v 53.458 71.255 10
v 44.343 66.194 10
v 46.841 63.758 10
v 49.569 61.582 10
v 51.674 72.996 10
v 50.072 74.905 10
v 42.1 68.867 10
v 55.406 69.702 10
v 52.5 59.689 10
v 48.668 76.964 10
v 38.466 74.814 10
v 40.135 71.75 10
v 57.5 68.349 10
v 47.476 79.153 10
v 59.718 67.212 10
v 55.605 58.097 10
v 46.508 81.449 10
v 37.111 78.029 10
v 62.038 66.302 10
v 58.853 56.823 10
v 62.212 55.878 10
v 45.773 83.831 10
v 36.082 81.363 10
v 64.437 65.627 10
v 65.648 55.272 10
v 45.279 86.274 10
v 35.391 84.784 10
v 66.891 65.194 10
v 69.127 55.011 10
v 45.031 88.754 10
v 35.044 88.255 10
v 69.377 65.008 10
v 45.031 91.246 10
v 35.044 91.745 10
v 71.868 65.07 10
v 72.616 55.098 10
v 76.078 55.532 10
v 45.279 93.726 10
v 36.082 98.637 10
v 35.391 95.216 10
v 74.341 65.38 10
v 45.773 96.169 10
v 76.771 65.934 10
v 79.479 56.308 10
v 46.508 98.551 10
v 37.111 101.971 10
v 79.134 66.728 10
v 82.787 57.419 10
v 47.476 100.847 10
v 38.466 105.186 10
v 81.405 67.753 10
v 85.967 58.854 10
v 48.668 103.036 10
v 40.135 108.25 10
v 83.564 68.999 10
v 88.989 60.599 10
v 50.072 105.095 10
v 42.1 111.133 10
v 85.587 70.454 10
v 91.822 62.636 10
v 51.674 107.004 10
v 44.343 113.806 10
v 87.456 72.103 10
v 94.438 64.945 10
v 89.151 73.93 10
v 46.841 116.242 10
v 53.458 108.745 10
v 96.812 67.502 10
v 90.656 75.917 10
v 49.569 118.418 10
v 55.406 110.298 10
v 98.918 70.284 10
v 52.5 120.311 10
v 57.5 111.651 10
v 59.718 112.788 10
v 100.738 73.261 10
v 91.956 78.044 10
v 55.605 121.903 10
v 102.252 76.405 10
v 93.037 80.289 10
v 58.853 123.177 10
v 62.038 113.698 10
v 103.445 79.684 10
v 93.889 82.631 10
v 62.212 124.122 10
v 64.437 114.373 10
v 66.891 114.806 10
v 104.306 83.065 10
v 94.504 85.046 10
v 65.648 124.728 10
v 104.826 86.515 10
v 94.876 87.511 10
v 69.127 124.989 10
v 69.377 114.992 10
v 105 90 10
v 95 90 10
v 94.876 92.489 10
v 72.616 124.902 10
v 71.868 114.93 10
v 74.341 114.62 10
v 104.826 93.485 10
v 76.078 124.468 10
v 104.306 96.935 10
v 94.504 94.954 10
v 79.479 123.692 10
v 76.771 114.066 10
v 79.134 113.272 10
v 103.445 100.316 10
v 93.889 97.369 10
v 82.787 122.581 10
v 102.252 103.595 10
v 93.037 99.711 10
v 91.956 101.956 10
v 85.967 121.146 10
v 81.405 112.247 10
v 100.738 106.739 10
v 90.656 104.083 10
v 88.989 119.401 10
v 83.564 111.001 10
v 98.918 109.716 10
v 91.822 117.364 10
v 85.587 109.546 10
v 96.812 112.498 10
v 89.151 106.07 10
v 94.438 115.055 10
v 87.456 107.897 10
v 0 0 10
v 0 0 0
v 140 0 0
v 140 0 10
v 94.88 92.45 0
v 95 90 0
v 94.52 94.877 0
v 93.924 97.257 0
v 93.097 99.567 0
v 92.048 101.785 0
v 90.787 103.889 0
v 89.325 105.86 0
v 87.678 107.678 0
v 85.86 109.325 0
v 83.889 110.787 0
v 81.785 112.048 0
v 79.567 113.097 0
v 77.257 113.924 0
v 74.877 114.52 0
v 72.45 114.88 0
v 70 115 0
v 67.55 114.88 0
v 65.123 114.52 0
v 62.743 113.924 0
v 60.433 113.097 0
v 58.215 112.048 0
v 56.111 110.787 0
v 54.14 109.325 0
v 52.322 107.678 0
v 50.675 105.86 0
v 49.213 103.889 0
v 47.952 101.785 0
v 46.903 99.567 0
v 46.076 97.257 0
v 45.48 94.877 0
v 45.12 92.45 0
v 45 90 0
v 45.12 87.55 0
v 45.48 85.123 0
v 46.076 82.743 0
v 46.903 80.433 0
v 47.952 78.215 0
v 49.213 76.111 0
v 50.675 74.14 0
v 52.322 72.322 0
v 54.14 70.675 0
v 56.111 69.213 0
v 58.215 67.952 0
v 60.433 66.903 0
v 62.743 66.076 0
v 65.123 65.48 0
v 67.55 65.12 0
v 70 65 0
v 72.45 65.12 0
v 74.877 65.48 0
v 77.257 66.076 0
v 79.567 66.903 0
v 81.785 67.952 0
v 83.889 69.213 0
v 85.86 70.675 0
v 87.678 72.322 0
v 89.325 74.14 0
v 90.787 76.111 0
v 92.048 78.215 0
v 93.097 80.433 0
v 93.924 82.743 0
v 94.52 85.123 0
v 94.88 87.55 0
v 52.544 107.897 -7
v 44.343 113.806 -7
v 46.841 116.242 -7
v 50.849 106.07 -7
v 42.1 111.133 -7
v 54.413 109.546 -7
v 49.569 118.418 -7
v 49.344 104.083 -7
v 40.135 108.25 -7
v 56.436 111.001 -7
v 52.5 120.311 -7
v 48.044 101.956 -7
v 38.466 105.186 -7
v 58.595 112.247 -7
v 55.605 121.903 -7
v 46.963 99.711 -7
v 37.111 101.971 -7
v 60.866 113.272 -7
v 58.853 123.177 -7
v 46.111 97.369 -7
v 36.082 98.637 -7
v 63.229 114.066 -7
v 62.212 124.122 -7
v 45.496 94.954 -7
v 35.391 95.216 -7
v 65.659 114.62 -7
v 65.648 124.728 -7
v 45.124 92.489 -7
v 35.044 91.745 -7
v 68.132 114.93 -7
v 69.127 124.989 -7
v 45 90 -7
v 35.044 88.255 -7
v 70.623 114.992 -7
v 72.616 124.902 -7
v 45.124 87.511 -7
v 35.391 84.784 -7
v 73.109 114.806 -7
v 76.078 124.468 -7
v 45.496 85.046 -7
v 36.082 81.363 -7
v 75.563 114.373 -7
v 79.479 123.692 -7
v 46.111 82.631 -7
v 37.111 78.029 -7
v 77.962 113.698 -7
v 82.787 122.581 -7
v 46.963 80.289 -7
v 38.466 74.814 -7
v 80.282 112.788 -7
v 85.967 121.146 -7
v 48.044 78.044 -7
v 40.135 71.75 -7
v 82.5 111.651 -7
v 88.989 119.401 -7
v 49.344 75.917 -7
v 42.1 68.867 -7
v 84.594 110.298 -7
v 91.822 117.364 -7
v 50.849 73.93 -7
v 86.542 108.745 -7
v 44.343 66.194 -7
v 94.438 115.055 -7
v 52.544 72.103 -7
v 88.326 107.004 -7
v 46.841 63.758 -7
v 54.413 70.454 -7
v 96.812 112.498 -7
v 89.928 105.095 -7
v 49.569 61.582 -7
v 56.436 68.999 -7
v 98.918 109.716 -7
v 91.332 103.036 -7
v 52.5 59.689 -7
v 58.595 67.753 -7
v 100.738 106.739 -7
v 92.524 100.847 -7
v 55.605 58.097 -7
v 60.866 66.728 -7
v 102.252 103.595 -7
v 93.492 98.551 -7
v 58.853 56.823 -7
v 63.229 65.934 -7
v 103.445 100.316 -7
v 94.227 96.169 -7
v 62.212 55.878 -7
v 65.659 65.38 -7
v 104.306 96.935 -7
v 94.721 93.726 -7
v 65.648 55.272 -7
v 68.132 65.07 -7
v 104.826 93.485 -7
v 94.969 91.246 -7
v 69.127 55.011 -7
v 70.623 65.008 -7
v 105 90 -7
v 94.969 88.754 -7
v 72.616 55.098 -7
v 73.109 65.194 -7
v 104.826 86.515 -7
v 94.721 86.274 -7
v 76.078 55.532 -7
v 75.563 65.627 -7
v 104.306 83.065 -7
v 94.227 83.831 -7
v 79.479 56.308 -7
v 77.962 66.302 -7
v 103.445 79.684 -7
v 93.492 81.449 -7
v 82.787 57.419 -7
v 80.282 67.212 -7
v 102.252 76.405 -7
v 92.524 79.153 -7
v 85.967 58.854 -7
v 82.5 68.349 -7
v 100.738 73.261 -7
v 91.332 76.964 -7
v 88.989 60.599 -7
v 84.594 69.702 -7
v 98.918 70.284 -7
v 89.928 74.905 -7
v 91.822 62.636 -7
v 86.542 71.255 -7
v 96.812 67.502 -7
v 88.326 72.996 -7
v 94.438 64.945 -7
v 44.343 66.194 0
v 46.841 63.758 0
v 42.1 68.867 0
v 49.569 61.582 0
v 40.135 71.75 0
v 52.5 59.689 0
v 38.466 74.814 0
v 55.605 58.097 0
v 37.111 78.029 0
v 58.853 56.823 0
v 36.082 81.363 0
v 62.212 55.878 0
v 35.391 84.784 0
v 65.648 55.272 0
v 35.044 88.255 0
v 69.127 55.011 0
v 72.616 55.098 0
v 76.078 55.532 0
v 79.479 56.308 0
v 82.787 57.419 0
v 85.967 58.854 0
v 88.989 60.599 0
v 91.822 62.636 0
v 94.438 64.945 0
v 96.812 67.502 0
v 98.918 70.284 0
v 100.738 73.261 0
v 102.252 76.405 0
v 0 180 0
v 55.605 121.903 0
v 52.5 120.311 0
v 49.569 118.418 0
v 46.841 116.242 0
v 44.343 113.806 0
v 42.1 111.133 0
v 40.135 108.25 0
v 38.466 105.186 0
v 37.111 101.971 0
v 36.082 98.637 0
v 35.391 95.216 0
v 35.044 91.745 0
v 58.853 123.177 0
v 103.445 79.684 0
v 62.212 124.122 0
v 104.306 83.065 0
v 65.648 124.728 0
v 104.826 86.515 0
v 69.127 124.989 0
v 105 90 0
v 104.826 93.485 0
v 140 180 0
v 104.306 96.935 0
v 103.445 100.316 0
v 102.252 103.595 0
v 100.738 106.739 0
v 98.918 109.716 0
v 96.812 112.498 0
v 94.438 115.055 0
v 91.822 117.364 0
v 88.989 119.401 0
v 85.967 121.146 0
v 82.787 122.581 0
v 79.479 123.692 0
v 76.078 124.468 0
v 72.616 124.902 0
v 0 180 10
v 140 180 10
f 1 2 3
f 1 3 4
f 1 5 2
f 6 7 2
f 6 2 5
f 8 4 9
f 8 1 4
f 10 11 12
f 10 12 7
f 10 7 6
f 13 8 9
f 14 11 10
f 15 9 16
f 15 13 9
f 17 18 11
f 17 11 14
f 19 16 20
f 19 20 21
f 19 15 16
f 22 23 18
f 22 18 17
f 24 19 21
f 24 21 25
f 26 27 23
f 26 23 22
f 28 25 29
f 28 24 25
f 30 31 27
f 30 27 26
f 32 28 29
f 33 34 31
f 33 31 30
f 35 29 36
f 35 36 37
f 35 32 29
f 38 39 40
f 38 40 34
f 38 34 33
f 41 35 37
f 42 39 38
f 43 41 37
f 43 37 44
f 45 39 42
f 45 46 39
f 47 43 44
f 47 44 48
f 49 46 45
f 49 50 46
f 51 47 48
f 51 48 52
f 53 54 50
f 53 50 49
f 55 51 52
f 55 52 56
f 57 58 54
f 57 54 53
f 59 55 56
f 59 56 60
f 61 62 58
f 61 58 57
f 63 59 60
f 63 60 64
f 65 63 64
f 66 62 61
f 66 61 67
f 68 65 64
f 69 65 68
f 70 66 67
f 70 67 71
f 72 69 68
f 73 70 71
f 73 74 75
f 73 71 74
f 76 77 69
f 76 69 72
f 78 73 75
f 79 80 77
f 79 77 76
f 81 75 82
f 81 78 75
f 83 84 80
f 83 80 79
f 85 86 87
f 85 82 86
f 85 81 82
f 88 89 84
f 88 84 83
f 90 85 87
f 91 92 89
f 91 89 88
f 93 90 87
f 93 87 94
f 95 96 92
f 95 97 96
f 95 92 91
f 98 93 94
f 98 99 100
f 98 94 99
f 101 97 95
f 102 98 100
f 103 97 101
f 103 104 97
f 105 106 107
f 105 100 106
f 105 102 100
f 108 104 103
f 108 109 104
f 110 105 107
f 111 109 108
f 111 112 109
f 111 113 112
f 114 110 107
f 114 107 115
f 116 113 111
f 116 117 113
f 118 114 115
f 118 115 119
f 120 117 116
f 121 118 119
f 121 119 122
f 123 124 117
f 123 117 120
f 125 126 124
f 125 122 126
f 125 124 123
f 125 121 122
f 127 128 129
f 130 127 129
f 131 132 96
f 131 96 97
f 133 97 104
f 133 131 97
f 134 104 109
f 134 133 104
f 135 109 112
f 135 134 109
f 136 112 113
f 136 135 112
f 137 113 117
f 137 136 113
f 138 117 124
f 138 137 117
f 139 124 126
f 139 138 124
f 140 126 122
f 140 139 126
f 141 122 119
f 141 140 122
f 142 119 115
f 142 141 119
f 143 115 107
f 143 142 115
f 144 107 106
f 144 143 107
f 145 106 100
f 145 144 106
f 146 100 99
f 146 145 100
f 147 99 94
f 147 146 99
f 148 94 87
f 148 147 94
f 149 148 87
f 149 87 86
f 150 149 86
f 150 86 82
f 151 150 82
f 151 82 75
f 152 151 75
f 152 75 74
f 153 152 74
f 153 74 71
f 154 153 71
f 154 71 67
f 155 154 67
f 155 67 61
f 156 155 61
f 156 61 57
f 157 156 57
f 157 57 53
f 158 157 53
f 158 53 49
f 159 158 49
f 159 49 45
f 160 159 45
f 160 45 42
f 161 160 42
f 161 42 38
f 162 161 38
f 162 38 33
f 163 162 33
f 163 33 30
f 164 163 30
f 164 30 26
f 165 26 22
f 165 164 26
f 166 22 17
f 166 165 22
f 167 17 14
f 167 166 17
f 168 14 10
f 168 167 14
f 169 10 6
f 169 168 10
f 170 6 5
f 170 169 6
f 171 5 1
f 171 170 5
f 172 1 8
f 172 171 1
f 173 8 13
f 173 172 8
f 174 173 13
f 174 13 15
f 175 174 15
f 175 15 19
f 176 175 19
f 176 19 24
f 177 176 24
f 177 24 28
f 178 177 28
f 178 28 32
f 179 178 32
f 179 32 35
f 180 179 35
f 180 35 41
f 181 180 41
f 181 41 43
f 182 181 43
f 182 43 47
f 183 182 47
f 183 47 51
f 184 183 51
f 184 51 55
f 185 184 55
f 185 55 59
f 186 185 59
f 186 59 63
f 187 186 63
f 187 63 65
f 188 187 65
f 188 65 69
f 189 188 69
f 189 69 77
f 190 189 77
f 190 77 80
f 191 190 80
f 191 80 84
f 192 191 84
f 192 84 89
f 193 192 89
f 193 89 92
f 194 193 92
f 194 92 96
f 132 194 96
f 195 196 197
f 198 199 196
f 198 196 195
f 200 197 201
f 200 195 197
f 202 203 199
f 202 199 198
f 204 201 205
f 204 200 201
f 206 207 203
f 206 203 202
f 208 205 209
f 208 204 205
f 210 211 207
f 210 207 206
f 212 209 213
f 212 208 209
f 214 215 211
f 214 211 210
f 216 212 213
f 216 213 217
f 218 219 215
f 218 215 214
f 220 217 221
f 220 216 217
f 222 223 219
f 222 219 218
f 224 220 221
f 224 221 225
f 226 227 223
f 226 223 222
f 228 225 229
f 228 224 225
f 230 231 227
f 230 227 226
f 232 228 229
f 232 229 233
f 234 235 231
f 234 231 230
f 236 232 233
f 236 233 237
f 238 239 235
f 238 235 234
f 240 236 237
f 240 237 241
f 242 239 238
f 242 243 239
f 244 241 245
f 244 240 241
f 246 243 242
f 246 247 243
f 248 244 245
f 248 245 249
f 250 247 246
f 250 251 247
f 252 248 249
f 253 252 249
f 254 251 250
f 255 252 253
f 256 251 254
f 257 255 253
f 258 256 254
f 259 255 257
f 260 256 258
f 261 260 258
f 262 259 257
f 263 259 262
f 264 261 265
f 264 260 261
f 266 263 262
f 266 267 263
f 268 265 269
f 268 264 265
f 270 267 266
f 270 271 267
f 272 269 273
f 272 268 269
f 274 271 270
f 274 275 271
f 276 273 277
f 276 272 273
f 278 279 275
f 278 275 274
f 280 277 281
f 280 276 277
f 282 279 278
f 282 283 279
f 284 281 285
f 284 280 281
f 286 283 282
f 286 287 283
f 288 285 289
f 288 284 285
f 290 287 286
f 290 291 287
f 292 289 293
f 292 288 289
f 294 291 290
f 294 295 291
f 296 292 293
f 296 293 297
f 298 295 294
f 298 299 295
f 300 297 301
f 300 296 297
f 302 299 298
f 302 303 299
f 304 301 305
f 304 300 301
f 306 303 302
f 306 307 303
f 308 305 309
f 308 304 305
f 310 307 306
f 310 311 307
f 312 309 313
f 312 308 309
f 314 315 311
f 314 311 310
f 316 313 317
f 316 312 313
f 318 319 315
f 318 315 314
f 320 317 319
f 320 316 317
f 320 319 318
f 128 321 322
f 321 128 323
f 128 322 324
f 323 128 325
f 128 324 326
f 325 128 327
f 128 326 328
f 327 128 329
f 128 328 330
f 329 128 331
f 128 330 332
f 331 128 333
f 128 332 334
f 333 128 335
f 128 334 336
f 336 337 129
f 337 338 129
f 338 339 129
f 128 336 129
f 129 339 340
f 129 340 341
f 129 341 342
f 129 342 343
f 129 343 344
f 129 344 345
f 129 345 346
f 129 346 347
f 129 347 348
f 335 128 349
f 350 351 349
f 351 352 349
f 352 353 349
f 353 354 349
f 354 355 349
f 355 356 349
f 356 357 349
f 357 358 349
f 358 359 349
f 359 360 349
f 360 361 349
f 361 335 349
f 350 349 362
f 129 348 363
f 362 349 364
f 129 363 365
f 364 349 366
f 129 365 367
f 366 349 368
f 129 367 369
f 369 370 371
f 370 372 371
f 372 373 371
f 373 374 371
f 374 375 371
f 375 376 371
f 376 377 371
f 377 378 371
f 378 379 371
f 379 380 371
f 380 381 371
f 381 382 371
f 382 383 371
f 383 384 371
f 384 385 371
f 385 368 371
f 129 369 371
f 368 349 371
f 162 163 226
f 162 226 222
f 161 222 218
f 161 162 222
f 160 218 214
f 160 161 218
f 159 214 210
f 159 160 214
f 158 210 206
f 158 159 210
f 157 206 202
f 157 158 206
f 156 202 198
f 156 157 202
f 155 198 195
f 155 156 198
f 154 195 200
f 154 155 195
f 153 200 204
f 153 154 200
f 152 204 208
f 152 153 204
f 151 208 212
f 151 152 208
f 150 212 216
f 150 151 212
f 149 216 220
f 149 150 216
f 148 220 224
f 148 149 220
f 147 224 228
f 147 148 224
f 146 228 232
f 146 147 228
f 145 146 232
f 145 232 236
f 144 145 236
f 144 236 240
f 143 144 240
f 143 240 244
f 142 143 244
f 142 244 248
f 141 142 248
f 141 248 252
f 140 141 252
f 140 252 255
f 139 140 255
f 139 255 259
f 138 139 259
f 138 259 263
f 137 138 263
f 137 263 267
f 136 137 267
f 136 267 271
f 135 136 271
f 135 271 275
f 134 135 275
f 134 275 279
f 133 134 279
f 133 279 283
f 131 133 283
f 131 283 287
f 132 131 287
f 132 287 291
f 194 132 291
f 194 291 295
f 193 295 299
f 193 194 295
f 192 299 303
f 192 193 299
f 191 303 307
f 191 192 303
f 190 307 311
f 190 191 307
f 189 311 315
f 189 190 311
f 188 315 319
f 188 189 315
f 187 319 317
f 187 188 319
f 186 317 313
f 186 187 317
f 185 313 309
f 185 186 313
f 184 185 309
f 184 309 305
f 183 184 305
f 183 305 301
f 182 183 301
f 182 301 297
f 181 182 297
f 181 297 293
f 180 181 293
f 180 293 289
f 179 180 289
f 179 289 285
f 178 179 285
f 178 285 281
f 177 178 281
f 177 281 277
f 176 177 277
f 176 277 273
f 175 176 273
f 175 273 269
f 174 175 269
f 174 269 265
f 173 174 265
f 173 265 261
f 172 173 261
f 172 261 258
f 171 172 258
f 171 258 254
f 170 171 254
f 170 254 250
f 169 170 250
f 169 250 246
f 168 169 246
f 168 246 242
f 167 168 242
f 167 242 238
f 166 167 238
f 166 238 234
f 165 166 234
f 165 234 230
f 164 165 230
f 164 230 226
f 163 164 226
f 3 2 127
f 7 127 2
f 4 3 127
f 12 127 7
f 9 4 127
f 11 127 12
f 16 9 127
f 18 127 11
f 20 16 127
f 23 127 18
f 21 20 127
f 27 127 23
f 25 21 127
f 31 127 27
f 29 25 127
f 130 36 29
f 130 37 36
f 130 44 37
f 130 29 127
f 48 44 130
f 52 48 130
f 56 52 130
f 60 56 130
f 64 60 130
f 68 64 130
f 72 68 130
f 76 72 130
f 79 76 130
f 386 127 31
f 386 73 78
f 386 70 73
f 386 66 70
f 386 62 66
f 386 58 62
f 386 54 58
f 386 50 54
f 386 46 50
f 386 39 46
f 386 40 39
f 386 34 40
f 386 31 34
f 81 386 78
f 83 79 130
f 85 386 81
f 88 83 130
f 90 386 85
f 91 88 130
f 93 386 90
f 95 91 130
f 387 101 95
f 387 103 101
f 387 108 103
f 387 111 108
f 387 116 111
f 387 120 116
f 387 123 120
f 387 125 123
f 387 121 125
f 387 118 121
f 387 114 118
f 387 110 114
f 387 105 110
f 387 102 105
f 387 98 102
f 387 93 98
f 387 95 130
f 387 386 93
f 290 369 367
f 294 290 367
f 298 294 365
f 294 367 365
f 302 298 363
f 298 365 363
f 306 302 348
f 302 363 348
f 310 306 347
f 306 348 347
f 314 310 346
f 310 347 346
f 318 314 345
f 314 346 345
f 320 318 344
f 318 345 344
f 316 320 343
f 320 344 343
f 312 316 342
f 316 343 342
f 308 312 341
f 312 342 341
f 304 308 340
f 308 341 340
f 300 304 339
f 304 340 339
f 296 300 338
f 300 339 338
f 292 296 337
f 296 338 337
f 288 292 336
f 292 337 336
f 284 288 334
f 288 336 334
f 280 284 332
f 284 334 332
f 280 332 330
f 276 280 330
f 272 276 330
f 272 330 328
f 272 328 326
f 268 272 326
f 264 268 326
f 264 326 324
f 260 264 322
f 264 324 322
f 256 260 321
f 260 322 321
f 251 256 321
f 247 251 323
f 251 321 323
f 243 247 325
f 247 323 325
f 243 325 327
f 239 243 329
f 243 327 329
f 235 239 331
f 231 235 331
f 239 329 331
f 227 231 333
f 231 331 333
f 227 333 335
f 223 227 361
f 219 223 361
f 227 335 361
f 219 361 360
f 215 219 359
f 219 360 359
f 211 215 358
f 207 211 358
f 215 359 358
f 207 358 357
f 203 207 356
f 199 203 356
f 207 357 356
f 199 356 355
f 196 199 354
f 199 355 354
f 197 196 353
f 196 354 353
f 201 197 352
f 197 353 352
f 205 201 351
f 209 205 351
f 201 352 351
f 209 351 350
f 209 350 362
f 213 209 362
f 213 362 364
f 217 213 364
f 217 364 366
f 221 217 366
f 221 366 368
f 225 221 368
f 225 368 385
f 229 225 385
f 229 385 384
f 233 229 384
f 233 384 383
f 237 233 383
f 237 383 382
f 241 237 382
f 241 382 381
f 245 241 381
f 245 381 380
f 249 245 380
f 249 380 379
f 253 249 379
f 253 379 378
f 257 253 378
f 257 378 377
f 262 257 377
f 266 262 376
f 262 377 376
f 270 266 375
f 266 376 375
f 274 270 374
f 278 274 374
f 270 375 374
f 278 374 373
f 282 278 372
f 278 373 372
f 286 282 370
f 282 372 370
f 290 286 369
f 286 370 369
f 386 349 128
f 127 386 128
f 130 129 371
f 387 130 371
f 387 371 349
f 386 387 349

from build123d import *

# Parameters (mm, degrees)
CROQUIS1_R              = 35
SALIENTE_EXTRUIR1_DEPTH = 10
CROQUIS2_R              = 35
CROQUIS2_R_2            = 25
SALIENTE_EXTRUIR2_DEPTH = 7
SALIENTE_EXTRUIR4_START = -10
CROQUIS3_R              = 35
CROQUIS3_R_2            = 25
SALIENTE_EXTRUIR4_DEPTH = 10


with BuildPart() as part:
    # Croquis1 → Saliente-Extruir1 (new body)
    with BuildSketch(Plane.XY):
        Polygon((0, 0), (140, 0), (140, 180), (0, 180), (0, 49.177666069), align=None)
        with Locations((70, 90)):
            Circle(CROQUIS1_R, mode=Mode.SUBTRACT)
    extrude(amount=SALIENTE_EXTRUIR1_DEPTH)



with BuildPart() as body_2:
    # Croquis2 → Saliente-Extruir2 (new body)
    with BuildSketch(Plane(origin=(0, 0, 0), x_dir=(-1, 0, 0), z_dir=(0, 0, -1))):
        with Locations(Location((-70, 90, 0), (0, 0, 180))):
            Circle(CROQUIS2_R)
        with Locations((-70, 90)):
            Circle(CROQUIS2_R_2, mode=Mode.SUBTRACT)
    extrude(amount=SALIENTE_EXTRUIR2_DEPTH)


with BuildPart() as part_1:
    add(part.part)

    add(body_2.part)  # Saliente-Extruir4 merges body 2
    # Croquis3 → Saliente-Extruir4 (add)
    with BuildSketch(Plane.XY.offset(10).offset(SALIENTE_EXTRUIR4_START)):
        with Locations((70, 90)):
            Circle(CROQUIS3_R)
        with Locations((70, 90)):
            Circle(CROQUIS3_R_2, mode=Mode.SUBTRACT)
    extrude(amount=SALIENTE_EXTRUIR4_DEPTH)


solid = part_1.part
